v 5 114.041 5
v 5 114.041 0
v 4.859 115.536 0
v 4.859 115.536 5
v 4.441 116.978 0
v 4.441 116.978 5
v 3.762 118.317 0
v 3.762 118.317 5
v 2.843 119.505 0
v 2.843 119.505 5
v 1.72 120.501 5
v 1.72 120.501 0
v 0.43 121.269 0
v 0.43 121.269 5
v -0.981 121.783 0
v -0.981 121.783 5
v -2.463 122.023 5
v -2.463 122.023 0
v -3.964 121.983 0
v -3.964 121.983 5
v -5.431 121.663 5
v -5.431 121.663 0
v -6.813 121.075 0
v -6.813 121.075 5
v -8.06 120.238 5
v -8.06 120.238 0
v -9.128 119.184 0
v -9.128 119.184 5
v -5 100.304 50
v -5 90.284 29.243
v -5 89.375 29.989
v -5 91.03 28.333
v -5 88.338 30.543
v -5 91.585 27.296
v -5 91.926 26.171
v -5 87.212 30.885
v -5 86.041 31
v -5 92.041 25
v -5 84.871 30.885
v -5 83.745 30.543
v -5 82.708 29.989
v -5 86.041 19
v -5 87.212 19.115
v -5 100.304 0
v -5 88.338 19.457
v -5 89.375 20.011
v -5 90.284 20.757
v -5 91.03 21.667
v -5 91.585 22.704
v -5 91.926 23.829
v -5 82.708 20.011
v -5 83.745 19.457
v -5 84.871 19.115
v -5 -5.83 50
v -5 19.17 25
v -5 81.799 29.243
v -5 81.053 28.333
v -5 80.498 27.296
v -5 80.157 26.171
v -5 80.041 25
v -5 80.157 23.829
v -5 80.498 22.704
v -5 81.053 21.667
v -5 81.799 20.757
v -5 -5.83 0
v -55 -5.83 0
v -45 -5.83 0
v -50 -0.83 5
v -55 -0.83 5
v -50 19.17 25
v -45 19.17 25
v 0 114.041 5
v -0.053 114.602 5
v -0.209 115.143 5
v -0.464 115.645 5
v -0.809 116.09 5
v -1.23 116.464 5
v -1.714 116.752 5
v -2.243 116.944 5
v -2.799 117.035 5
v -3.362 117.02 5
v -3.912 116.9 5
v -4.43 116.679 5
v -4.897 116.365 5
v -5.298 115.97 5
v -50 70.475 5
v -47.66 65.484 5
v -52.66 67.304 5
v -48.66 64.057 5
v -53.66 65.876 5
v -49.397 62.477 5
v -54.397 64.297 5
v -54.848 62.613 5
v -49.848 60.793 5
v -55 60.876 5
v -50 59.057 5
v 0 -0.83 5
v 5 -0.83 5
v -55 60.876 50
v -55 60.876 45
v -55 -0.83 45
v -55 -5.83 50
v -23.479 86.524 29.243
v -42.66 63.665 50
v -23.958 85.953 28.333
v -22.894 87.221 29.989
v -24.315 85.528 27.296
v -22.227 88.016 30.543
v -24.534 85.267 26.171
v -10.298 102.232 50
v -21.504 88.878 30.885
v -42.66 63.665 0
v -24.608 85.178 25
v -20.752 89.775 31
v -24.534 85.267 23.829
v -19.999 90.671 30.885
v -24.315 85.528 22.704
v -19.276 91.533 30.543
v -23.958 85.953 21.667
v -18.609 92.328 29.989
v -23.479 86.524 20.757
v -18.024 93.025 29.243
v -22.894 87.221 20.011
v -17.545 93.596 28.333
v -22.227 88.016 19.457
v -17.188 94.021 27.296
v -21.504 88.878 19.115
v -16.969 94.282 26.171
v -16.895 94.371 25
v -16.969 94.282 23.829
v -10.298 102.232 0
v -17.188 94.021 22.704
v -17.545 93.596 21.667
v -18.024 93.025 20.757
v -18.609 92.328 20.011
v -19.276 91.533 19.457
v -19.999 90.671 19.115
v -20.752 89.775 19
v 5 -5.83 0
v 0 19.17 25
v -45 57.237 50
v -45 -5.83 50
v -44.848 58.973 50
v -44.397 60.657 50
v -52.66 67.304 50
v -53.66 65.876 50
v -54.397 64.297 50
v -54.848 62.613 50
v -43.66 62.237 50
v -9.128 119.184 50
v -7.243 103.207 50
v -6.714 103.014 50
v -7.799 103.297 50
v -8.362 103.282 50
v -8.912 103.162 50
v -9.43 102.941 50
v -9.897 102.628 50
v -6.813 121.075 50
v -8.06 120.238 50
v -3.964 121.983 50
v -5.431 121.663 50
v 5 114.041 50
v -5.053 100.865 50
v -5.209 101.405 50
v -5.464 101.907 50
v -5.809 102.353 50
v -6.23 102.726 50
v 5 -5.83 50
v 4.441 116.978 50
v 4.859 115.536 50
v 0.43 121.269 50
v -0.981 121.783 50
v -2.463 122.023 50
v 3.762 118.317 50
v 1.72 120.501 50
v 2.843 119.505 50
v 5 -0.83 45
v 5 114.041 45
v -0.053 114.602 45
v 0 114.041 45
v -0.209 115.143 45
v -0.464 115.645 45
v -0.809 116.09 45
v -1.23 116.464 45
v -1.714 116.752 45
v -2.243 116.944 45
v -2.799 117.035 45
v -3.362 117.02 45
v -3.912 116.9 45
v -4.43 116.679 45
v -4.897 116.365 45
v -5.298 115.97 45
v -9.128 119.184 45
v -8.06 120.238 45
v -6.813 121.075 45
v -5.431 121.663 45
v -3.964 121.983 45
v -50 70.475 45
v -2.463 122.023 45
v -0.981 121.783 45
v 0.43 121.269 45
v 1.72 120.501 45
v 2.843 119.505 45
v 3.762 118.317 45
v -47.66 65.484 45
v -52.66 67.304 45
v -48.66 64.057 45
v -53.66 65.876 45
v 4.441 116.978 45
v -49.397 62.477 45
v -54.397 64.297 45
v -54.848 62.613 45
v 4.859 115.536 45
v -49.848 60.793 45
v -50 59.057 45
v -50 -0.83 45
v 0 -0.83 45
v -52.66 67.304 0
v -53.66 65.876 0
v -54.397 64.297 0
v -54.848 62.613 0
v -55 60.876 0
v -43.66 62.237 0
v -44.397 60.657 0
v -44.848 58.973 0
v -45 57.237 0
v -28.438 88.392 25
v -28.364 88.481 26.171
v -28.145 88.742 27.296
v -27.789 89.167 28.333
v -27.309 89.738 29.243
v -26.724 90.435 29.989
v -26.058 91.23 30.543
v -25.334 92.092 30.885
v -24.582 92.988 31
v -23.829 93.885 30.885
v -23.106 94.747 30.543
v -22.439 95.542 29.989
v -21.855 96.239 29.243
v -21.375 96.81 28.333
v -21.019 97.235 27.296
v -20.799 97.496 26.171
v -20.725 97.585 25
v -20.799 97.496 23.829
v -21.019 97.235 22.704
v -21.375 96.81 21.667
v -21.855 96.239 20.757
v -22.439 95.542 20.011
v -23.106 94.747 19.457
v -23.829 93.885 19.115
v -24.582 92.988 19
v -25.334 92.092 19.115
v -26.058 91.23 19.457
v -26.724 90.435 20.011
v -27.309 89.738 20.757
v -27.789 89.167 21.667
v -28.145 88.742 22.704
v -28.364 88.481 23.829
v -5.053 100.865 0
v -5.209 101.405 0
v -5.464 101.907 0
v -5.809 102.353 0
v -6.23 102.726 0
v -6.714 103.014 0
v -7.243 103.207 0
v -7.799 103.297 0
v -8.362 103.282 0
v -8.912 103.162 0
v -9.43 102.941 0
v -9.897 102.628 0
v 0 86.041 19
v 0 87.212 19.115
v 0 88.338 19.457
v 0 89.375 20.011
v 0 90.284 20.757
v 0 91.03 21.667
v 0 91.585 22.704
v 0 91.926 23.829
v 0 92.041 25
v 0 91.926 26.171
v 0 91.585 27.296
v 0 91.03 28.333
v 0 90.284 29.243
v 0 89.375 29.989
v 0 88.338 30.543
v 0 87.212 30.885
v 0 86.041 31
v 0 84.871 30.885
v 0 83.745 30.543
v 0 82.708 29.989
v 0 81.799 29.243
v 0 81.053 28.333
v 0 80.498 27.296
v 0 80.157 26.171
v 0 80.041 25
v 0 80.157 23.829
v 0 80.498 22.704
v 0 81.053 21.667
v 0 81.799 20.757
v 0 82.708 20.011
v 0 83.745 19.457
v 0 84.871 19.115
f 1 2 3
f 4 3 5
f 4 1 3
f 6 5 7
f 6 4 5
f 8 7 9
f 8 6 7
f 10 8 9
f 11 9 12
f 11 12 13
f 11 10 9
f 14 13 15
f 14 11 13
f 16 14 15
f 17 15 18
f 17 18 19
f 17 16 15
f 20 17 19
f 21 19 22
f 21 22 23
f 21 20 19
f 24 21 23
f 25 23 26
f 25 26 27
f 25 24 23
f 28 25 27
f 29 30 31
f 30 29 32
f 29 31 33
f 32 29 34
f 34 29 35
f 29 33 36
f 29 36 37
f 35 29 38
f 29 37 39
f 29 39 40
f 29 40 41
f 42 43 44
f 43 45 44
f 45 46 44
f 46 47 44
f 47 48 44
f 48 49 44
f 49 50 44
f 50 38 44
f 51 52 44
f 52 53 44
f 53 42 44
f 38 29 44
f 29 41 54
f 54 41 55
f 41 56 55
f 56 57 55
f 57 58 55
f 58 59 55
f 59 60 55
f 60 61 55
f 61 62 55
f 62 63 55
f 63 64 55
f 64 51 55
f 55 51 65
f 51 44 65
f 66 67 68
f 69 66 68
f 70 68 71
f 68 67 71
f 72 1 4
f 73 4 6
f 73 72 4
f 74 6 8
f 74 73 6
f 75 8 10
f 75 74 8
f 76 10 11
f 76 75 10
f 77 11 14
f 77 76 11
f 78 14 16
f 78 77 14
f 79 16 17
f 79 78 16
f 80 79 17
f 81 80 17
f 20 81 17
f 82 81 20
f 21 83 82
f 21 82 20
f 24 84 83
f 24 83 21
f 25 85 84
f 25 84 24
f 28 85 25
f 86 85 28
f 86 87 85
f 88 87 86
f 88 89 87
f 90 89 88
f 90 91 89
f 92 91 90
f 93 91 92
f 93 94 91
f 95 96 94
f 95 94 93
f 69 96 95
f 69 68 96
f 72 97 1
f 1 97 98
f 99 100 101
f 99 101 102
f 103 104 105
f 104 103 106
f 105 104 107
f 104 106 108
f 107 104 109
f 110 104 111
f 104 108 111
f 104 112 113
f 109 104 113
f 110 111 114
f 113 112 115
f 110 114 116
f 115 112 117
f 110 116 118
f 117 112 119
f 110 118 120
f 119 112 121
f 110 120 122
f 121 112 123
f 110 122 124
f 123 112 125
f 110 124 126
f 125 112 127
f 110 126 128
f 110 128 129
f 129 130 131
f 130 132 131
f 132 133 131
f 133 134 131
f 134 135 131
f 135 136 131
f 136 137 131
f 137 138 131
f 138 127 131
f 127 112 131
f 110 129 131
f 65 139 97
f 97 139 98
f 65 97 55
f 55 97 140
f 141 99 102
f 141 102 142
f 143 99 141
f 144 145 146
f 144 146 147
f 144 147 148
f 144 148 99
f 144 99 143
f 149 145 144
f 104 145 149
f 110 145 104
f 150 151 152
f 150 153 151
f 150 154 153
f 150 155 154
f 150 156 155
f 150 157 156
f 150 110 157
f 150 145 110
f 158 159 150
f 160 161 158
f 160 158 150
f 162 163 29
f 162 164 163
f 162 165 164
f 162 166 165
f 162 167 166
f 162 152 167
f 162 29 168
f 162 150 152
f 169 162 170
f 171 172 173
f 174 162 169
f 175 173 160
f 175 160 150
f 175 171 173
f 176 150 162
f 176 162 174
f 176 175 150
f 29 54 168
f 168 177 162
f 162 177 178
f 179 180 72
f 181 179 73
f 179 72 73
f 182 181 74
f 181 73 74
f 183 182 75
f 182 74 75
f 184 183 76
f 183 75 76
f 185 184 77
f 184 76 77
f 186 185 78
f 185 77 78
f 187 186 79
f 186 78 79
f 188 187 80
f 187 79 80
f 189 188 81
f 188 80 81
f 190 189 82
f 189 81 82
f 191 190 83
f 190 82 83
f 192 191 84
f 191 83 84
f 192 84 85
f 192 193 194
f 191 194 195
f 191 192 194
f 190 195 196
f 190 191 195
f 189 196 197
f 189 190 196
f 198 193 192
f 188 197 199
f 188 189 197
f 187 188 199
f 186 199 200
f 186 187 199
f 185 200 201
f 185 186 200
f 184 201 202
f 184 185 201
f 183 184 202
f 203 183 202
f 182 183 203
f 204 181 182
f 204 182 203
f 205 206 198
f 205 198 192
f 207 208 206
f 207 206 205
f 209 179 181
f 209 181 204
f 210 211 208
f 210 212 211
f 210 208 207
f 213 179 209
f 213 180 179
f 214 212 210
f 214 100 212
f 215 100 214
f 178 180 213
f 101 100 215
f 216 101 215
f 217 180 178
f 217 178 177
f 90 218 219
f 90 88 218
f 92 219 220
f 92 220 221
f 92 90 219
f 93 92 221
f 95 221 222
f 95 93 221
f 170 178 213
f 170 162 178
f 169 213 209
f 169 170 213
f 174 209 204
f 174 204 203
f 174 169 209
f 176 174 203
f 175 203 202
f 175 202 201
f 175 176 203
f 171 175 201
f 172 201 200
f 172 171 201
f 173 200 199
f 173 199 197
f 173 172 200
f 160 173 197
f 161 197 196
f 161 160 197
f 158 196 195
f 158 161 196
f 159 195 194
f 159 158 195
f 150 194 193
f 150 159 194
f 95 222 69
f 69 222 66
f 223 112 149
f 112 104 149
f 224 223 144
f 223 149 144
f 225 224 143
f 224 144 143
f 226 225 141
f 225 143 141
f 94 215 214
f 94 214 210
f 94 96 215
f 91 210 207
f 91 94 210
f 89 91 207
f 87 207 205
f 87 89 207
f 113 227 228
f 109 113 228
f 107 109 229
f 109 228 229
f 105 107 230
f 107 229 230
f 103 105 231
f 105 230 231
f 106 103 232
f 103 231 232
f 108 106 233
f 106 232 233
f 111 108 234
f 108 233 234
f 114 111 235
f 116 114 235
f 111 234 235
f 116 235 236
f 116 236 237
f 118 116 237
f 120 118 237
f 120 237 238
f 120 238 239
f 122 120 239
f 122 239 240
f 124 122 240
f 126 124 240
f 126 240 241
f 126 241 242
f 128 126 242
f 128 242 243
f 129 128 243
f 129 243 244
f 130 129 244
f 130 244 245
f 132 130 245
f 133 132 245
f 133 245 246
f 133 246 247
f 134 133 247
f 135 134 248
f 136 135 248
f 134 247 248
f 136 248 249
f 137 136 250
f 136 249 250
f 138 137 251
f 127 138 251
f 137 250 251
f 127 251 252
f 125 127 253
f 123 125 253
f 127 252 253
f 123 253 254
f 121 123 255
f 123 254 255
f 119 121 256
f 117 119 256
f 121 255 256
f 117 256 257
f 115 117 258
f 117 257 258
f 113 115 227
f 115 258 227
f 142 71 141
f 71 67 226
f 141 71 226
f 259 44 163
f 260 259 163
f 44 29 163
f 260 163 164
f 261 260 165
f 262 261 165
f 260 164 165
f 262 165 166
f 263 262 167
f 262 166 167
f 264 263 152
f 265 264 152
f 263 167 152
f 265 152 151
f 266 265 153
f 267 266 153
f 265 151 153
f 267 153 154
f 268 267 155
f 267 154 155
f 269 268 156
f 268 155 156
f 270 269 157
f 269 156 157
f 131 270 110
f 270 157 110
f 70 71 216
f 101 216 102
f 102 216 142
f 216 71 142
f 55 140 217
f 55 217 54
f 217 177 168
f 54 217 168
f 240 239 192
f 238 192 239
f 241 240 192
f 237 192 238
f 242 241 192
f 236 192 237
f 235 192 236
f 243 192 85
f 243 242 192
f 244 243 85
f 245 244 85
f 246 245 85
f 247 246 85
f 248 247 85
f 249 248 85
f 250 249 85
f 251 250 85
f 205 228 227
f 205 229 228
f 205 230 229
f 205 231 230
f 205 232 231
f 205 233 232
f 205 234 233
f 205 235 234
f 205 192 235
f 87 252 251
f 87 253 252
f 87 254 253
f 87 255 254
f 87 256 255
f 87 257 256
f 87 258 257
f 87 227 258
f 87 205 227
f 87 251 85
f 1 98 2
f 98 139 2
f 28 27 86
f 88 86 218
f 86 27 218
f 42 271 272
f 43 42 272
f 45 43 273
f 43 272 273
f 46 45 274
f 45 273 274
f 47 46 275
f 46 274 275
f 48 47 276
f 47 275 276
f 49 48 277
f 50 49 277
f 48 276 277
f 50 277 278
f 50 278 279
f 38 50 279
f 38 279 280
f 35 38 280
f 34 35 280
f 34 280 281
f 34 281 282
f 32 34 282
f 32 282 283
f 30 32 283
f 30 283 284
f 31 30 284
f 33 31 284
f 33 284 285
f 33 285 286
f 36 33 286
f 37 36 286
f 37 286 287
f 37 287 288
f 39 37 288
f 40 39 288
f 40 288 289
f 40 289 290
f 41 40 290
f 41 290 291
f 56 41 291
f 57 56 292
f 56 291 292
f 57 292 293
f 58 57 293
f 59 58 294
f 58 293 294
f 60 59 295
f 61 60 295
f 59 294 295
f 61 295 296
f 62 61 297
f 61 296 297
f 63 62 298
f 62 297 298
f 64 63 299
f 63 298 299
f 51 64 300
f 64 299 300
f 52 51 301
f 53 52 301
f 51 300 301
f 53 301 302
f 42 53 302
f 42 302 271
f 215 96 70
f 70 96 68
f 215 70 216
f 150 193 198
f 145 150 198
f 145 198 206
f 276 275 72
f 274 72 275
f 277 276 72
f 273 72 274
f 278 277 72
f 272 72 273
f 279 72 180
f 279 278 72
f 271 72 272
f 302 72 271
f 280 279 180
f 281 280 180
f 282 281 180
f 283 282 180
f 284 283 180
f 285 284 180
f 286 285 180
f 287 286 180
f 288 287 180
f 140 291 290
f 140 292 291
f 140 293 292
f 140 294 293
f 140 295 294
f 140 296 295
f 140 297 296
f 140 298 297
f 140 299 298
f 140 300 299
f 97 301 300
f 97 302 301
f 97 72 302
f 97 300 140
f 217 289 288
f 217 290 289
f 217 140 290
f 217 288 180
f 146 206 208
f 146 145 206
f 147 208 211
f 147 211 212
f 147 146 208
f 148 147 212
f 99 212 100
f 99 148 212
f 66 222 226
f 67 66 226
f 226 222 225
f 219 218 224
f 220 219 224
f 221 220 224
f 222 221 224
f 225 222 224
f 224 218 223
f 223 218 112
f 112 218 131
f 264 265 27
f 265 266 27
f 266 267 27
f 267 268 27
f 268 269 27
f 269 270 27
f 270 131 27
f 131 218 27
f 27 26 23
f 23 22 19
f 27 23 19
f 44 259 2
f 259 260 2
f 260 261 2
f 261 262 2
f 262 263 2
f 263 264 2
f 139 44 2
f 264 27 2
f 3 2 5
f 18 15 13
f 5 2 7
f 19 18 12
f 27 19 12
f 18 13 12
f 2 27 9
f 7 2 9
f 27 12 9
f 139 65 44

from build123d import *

# Parameters (mm, degrees)
BOSS_EXTRUDE2_DEPTH = 50
CUT_EXTRUDE1_REACH  = 175.469
SKETCH2_W           = 5
SKETCH2_H           = 40
SKETCH3_W           = 40
SKETCH3_H           = 5
CUT_EXTRUDE4_DEPTH  = 25
CUT_EXTRUDE5_REACH  = 148.615
SKETCH5_W           = 40
SKETCH5_H           = 5
CUT_EXTRUDE6_REACH  = 175.469
SKETCH6_W           = 5
SKETCH6_H           = 40
FILLET1_R           = 10
FILLET2_R           = 3
FILLET3_R           = 8
CUT_EXTRUDE7_REACH  = 146.893
CUT_EXTRUDE8_DEPTH  = 145.893467036
SKETCH10_W          = 50
SKETCH10_H          = 14.886309014
CUT_EXTRUDE9_DEPTH  = 145.893467036
CUT_EXTRUDE10_REACH = 110.938
SKETCH11_R          = 6
CUT_EXTRUDE11_REACH = 144.895
SKETCH12_R          = 6


with BuildPart() as part:
    # Sketch1 → Boss-Extrude2 (new body)
    with BuildSketch(Plane.XY):
        Polygon((5, -20.716112532), (5, 136.021274565), (-55, 64.51605901), (-55, -20.716112532), (-45, -20.716112532), (-45, 60.876356667), (-5, 108.546500371), (-5, -20.716112532), align=None)
    extrude(amount=BOSS_EXTRUDE2_DEPTH)

    # Cut-Extrude1: up to this plane
    cut_extrude1_end = Plane(origin=(5, 136.021274565, 50), z_dir=(0.7660444431189773, -0.6427876096865403, 0))
    # Sketch2 → Cut-Extrude1 (cut, up to the surface)
    with BuildSketch(Plane.XZ.offset(20.716112532), mode=Mode.PRIVATE) as cut_extrude1_sk1:
        with Locations((-52.5, 25)):
            Rectangle(SKETCH2_W, SKETCH2_H)
    cut_extrude1_tool1 = split(extrude(cut_extrude1_sk1.sketch, amount=-CUT_EXTRUDE1_REACH, mode=Mode.PRIVATE), bisect_by=cut_extrude1_end, keep=Keep.BOTH, mode=Mode.PRIVATE)
    add(cut_extrude1_tool1.solids().sort_by_distance((-52.5, -20.716113, 25))[0], mode=Mode.SUBTRACT)

    # Sketch3 → Cut-Extrude4 (cut)
    with BuildSketch(Plane(origin=(14.043282439, 16.736132299, 0), x_dir=(0, 0, -1), z_dir=(0.6427876096865403, 0.7660444431189773, 0))):
        with Locations((-25, 81.102567729)):
            Rectangle(SKETCH3_W, SKETCH3_H)
    extrude(amount=-CUT_EXTRUDE4_DEPTH, mode=Mode.SUBTRACT)

    # Cut-Extrude5: up to this plane
    cut_extrude5_end = Plane(origin=(5, -20.716112532, 50), z_dir=(-1, 0, 0))
    # Sketch5 → Cut-Extrude5 (cut, up to the surface)
    with BuildSketch(Plane(origin=(14.043282439, 16.736132299, 0), x_dir=(0, 0, -1), z_dir=(0.6427876096865403, 0.7660444431189773, 0)), mode=Mode.PRIVATE) as cut_extrude5_sk1:
        with Locations((-25, 81.102567729)):
            Rectangle(SKETCH5_W, SKETCH5_H)
    cut_extrude5_tool1 = split(extrude(cut_extrude5_sk1.sketch, amount=CUT_EXTRUDE5_REACH, mode=Mode.PRIVATE), bisect_by=cut_extrude5_end, keep=Keep.BOTH, mode=Mode.PRIVATE)
    add(cut_extrude5_tool1.solids().sort_by_distance((-48.084889, 68.867858, 25))[0], mode=Mode.SUBTRACT)

    # Cut-Extrude6: up to this plane
    cut_extrude6_end = Plane(origin=(-62.239468027, 48.109777846, 45), z_dir=(0.7660444431189773, -0.6427876096865403, 0))
    # Sketch6 → Cut-Extrude6 (cut, up to the surface)
    with BuildSketch(Plane.XZ.offset(20.716112532), mode=Mode.PRIVATE) as cut_extrude6_sk1:
        with Locations((2.5, 25)):
            Rectangle(SKETCH6_W, SKETCH6_H)
    cut_extrude6_tool1 = split(extrude(cut_extrude6_sk1.sketch, amount=-CUT_EXTRUDE6_REACH, mode=Mode.PRIVATE), bisect_by=cut_extrude6_end, keep=Keep.BOTH, mode=Mode.PRIVATE)
    add(cut_extrude6_tool1.solids().sort_by_distance((2.5, -20.716113, 25))[0], mode=Mode.SUBTRACT)

    # Fillet1
    fillet1_edges = [part.edges().sort_by_distance(p)[0] for p in [
        (-45, 60.876356667, 25),
        (-55, 64.51605901, 47.5),
        (-55, 64.51605901, 2.5),
        (-50, 62.696207838, 25),
    ]]
    fillet(fillet1_edges, radius=FILLET1_R)

    # Fillet2
    fillet2_edges = [part.edges().sort_by_distance(p)[0] for p in [
        (-5, 108.546500371, 25),
        (0, 122.283887468, 25),
    ]]
    fillet(fillet2_edges, radius=FILLET2_R)

    # Fillet3
    fillet3_edges = [part.edges().sort_by_distance(p)[0] for p in [
        (5, 136.021274565, 47.5),
        (5, 136.021274565, 2.5),
    ]]
    fillet(fillet3_edges, radius=FILLET3_R)

    # Cut-Extrude7: up to this face of the body (flat: up to its plane)
    cut_extrude7_end = Plane(part.part.faces().sort_by_distance((5, 46.662671339, 2.5))[0])
    # Sketch8 → Cut-Extrude7 (cut, up to the picked face)
    with BuildSketch(Plane.ZY.offset(55), mode=Mode.PRIVATE) as cut_extrude7_sk1:
        Polygon((0, -20.716112532), (25, 19.170196482), (50, -20.716112532), align=None)
    cut_extrude7_tool1 = split(extrude(cut_extrude7_sk1.sketch, amount=-CUT_EXTRUDE7_REACH, mode=Mode.PRIVATE), bisect_by=cut_extrude7_end, keep=Keep.BOTH, mode=Mode.PRIVATE)
    add(cut_extrude7_tool1.solids().sort_by(Axis((-55, -7.420676, 25), (1, 0, 0)))[0], mode=Mode.SUBTRACT)

    # Sketch9 → Cut-Extrude8 (cut, through all)
    with BuildSketch(Plane(origin=(5, 0, 0), x_dir=(0, 0, -1), z_dir=(1, 0, 0))):
        Polygon((0, -5.829803518), (-25, 19.170196482), (-50, -5.829803518), align=None)
    extrude(amount=-CUT_EXTRUDE8_DEPTH, mode=Mode.SUBTRACT)


with BuildPart() as cut_extrude8_piece_1:
    # of the separate pieces the step leaves, piece 1, a body of its own (cut_extrude8_pieces)
    add(part.part.solids().sort_by_distance((-5, 100.304068112, 0))[0])

    # Sketch11 → Cut-Extrude10 (cut, up to next)
    with BuildSketch(Plane(origin=(-60.213060223, 50.524756626, 0), x_dir=(0, 0, 1), z_dir=(-0.7660444431189772, 0.6427876096865404, 0)), mode=Mode.PRIVATE) as cut_extrude10_sk1:
        with Locations(Location((25, 55.43246022, 0), (0, 0, 270))):
            Circle(SKETCH11_R)
    cut_extrude10_tool1 = extrude(cut_extrude10_sk1.sketch, amount=-CUT_EXTRUDE10_REACH, mode=Mode.PRIVATE) & cut_extrude8_piece_1.part
    add(cut_extrude10_tool1.solids().sort_by_distance((-24.581762, 92.988485, 25))[0], mode=Mode.SUBTRACT)

    # Sketch12 → Cut-Extrude11 (cut, up to next)
    with BuildSketch(Plane(origin=(0, 0, 0), x_dir=(0, 0, -1), z_dir=(1, 0, 0)), mode=Mode.PRIVATE) as cut_extrude11_sk1:
        with Locations((-25, 86.04145521)):
            Circle(SKETCH12_R)
    cut_extrude11_tool1 = extrude(cut_extrude11_sk1.sketch, amount=-CUT_EXTRUDE11_REACH, mode=Mode.PRIVATE) & cut_extrude8_piece_1.part
    add(cut_extrude11_tool1.solids().sort_by_distance((0, 86.041455, 25))[0], mode=Mode.SUBTRACT)


with BuildPart() as cut_extrude8_piece_2:
    # of the separate pieces the step leaves, piece 2, a body of its own (cut_extrude8_pieces)
    add(part.part.solids().sort_by_distance((-5, -20.716112532, 0))[0])


with BuildPart() as cut_extrude8_piece_3:
    # of the separate pieces the step leaves, piece 3, a body of its own (cut_extrude8_pieces)
    add(part.part.solids().sort_by_distance((-45, -20.716112532, 0))[0])


with BuildPart() as cut_extrude8_piece_4:
    # of the separate pieces the step leaves, piece 4, a body of its own (cut_extrude8_pieces)
    add(part.part.solids().sort_by_distance((-5, -20.716112532, 50))[0])


with BuildPart() as cut_extrude8_piece_5:
    # of the separate pieces the step leaves, piece 5, a body of its own (cut_extrude8_pieces)
    add(part.part.solids().sort_by_distance((-45, -20.716112532, 50))[0])


with BuildPart() as cut_extrude9_tool:
    # Sketch10 → Cut-Extrude9 (new, through all)
    with BuildSketch(Plane.ZY.offset(55)):
        with Locations((25, -13.272958025)):
            Rectangle(SKETCH10_W, SKETCH10_H)
    extrude(amount=-CUT_EXTRUDE9_DEPTH)


with BuildPart() as cut_extrude8_piece_2_1:
    add(cut_extrude8_piece_2.part)

    # Cut-Extrude9: cut by cut_extrude9_tool
    add(cut_extrude9_tool.part, mode=Mode.SUBTRACT)


with BuildPart() as cut_extrude8_piece_3_1:
    add(cut_extrude8_piece_3.part)

    # Cut-Extrude9: cut by cut_extrude9_tool
    add(cut_extrude9_tool.part, mode=Mode.SUBTRACT)


with BuildPart() as cut_extrude8_piece_4_1:
    add(cut_extrude8_piece_4.part)

    # Cut-Extrude9: cut by cut_extrude9_tool
    add(cut_extrude9_tool.part, mode=Mode.SUBTRACT)


with BuildPart() as cut_extrude8_piece_5_1:
    add(cut_extrude8_piece_5.part)

    # Cut-Extrude9: cut by cut_extrude9_tool
    add(cut_extrude9_tool.part, mode=Mode.SUBTRACT)


solid = cut_extrude8_piece_1.part
